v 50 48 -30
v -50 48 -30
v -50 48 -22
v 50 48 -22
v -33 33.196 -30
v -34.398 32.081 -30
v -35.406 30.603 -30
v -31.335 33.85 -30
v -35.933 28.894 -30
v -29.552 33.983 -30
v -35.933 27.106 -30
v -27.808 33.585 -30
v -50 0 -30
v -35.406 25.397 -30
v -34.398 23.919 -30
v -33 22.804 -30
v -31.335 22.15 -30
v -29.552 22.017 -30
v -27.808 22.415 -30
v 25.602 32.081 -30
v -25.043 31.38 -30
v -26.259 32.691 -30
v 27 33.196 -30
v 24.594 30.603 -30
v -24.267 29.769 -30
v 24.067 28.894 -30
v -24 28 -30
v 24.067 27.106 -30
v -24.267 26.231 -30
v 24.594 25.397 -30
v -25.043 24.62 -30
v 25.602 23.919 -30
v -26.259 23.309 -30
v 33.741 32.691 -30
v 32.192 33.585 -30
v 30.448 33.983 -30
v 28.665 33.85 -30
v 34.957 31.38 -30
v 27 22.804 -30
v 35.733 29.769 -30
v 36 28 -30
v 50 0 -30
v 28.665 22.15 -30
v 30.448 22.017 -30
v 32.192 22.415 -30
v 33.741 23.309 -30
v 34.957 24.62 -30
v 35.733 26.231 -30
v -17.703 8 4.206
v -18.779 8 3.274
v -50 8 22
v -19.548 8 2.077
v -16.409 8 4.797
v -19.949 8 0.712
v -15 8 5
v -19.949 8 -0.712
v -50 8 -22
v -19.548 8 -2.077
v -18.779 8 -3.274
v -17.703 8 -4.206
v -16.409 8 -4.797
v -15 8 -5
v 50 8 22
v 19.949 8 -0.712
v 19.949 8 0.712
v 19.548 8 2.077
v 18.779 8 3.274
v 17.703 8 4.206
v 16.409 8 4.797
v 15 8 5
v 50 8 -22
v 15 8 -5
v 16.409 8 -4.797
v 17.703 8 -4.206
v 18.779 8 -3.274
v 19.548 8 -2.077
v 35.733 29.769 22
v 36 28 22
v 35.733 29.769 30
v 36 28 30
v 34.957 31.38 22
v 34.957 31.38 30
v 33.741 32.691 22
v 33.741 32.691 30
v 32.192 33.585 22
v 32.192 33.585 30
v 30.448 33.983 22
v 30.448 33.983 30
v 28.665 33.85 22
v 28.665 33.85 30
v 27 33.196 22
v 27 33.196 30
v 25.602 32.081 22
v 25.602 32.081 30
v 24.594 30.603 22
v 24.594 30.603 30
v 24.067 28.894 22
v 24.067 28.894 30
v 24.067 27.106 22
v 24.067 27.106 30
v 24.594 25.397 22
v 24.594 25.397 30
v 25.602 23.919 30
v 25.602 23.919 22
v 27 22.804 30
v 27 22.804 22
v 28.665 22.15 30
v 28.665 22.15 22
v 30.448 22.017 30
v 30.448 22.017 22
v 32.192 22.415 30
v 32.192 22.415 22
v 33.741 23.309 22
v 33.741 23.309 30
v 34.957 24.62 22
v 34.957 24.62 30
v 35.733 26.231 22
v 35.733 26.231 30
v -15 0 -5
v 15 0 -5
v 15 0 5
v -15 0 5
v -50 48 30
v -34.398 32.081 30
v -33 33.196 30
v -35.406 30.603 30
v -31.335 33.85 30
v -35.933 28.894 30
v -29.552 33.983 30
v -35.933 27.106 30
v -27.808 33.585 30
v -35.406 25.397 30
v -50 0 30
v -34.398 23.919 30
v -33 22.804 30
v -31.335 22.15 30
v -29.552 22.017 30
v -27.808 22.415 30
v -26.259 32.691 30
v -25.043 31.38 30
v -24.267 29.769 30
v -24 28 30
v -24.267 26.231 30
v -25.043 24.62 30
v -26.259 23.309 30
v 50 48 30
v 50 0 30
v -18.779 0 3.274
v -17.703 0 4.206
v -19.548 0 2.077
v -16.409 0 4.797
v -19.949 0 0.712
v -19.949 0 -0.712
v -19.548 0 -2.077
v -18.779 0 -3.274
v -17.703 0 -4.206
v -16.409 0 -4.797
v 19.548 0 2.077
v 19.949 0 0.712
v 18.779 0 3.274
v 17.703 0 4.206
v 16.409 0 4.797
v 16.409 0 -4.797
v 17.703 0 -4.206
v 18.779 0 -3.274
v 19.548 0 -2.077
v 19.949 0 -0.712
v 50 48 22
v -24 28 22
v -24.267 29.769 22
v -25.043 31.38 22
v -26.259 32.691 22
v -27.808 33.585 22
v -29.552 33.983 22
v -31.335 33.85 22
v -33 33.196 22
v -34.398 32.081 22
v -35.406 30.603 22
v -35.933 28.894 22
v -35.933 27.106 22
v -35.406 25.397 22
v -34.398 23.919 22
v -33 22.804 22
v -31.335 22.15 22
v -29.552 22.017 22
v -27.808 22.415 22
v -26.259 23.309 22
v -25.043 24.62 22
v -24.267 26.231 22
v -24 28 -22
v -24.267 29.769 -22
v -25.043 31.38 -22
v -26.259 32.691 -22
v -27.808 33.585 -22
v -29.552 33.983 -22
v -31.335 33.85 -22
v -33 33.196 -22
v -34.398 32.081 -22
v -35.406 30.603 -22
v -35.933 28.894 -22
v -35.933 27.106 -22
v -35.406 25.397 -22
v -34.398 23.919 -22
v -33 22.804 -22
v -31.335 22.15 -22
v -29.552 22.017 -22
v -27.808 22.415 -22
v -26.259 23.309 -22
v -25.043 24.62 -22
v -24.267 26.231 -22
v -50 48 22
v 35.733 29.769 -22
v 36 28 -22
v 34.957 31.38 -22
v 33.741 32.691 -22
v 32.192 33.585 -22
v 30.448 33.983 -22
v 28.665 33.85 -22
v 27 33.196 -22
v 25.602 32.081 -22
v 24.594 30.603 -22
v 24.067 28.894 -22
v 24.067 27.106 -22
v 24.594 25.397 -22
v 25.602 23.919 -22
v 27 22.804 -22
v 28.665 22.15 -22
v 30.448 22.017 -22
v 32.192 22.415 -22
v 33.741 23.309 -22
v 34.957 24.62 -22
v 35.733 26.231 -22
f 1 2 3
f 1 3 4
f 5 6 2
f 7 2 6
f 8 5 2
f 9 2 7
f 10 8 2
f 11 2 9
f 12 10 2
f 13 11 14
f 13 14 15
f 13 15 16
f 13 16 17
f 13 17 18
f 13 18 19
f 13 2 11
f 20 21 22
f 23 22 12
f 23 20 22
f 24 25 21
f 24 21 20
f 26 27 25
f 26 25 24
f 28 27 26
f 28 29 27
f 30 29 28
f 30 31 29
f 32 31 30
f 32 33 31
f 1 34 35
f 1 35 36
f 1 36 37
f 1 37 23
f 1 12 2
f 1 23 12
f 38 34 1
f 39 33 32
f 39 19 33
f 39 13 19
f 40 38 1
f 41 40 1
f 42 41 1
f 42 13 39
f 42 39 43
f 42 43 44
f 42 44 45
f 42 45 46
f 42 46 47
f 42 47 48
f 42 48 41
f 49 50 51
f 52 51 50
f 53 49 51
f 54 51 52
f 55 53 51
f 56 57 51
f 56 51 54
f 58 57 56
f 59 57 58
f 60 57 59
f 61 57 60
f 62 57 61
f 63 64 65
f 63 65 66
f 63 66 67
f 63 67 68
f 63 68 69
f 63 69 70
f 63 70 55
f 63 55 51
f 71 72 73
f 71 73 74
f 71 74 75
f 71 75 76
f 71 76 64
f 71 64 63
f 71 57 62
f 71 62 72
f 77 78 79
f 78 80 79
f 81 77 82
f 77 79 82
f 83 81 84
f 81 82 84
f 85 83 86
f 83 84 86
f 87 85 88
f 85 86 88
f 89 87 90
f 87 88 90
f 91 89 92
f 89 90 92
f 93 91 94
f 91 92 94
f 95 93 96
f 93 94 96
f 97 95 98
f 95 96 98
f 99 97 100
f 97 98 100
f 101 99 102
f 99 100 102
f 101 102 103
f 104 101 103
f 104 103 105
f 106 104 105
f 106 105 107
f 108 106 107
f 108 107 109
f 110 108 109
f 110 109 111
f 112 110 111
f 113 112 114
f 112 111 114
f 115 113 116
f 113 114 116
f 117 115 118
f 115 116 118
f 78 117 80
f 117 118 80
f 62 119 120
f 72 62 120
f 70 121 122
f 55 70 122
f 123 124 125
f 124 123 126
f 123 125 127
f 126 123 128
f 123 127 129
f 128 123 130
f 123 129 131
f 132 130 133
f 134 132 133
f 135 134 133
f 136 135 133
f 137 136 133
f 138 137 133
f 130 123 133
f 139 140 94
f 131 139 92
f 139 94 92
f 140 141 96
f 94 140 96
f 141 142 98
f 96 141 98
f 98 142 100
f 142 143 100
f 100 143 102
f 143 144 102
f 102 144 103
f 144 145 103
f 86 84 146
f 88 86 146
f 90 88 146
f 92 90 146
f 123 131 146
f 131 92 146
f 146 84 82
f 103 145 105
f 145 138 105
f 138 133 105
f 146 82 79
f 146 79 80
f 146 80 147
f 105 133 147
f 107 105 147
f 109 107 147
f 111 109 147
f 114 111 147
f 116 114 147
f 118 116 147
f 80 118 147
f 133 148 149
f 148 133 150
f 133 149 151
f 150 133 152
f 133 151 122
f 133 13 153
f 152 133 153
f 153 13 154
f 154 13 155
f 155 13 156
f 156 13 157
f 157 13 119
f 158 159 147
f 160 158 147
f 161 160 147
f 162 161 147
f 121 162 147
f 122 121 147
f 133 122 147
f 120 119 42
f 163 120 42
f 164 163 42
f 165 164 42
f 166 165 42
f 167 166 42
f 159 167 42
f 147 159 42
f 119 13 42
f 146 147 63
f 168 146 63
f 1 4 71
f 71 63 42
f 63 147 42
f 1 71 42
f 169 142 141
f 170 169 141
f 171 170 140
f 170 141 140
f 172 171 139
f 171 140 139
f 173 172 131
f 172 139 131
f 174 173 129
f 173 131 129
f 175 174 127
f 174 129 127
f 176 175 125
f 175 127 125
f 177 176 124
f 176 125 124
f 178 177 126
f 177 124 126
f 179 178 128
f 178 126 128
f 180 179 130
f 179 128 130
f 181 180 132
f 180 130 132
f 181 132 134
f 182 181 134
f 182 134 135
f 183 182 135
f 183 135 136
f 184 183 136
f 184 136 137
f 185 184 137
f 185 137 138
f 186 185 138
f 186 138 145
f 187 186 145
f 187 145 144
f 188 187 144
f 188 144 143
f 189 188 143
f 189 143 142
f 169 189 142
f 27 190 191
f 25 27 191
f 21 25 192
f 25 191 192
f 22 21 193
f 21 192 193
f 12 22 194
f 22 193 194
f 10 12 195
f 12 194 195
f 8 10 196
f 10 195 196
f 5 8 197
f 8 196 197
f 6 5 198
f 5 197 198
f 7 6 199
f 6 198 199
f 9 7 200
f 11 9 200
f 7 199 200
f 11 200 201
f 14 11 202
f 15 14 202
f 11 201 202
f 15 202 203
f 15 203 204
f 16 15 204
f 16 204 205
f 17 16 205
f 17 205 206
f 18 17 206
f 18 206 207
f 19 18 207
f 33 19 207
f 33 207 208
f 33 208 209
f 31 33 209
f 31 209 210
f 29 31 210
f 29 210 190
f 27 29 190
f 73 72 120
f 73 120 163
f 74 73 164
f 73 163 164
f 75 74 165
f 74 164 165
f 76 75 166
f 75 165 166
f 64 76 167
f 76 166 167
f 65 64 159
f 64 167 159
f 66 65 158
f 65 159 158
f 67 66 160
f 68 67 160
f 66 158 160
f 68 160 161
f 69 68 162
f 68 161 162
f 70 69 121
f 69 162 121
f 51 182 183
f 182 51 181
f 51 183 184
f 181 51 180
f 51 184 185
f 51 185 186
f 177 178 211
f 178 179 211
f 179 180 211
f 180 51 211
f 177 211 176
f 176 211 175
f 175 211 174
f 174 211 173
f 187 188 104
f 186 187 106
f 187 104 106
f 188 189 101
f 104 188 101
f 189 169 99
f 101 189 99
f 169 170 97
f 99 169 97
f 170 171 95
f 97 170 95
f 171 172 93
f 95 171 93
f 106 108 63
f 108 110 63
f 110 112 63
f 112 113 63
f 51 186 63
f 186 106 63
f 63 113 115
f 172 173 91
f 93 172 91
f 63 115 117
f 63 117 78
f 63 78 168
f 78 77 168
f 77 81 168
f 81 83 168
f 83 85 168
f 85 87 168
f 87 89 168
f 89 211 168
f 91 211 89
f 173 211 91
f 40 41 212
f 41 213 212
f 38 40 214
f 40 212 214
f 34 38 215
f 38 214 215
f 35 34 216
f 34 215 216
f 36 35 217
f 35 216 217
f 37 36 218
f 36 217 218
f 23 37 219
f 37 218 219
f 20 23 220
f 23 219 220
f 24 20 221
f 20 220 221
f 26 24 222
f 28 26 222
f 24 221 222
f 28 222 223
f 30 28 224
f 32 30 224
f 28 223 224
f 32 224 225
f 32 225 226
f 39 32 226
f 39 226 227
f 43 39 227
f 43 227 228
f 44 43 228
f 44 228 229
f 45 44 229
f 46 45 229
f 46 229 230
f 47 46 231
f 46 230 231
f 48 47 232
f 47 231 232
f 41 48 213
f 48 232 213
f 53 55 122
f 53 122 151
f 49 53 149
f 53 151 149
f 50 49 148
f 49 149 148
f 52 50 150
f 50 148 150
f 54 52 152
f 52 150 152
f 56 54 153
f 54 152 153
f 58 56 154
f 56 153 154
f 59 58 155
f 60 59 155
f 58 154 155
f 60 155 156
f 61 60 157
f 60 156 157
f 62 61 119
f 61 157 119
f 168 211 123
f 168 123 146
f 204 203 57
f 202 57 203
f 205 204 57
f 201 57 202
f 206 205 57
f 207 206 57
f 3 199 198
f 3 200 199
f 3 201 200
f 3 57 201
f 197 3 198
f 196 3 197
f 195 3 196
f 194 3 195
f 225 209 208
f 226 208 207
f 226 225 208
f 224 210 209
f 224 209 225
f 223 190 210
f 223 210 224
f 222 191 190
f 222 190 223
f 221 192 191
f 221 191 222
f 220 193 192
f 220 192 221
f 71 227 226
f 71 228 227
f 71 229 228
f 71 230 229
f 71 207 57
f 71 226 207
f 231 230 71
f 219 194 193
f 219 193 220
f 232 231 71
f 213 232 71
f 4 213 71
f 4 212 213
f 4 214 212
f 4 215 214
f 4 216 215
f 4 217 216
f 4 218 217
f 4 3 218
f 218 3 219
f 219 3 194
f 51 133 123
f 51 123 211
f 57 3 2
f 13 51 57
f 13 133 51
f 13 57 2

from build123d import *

# Parameters (mm, degrees)
SKETCH_1_W          = 100
SKETCH_1_H          = 60
EXTRUDE_1_DEPTH     = 48
SKETCH_2_W          = 104
SKETCH_2_H          = 44
CUT_EXTRUDE_1_DEPTH = 40
CUT_EXTRUDE_2_DEPTH = 76.524830354
SKETCH_4_R          = 6
CUT_EXTRUDE_3_DEPTH = 101


with BuildPart() as part:
    # 草图1 → 凸台-拉伸1 (new body)
    with BuildSketch(Plane(origin=(0, 0, 0), x_dir=(1, 0, 0), z_dir=(0, 1, 0))):
        Rectangle(SKETCH_1_W, SKETCH_1_H)
    extrude(amount=EXTRUDE_1_DEPTH)

    # 草图2 → 切除-拉伸1 (cut)
    with BuildSketch(Plane(origin=(0, 48, 0), x_dir=(1, 0, 0), z_dir=(0, 1, 0))):
        Rectangle(SKETCH_2_W, SKETCH_2_H)
    extrude(amount=-CUT_EXTRUDE_1_DEPTH, mode=Mode.SUBTRACT)

    # 草图3 → 切除-拉伸2 (cut, through all)
    with BuildSketch(Plane(origin=(0, 0, 0), x_dir=(1, 0, 0), z_dir=(0, 1, 0))):
        with BuildLine():
            Line((-15, 5), (15, 5))
            ThreePointArc((15, 5), (20, 0), (15, -5))
            Line((15, -5), (-15, -5))
            ThreePointArc((-15, -5), (-20, 0), (-15, 5))
        make_face()
    extrude(amount=CUT_EXTRUDE_2_DEPTH, mode=Mode.SUBTRACT)

    # 草图4 → 切除-拉伸3 (cut, symmetric)
    with BuildSketch(Plane.XY.offset(30)):
        with Locations((-30, 28)):
            Circle(SKETCH_4_R)
        with Locations((30, 28)):
            Circle(SKETCH_4_R)
    extrude(amount=CUT_EXTRUDE_3_DEPTH, both=True, mode=Mode.SUBTRACT)


solid = part.part
